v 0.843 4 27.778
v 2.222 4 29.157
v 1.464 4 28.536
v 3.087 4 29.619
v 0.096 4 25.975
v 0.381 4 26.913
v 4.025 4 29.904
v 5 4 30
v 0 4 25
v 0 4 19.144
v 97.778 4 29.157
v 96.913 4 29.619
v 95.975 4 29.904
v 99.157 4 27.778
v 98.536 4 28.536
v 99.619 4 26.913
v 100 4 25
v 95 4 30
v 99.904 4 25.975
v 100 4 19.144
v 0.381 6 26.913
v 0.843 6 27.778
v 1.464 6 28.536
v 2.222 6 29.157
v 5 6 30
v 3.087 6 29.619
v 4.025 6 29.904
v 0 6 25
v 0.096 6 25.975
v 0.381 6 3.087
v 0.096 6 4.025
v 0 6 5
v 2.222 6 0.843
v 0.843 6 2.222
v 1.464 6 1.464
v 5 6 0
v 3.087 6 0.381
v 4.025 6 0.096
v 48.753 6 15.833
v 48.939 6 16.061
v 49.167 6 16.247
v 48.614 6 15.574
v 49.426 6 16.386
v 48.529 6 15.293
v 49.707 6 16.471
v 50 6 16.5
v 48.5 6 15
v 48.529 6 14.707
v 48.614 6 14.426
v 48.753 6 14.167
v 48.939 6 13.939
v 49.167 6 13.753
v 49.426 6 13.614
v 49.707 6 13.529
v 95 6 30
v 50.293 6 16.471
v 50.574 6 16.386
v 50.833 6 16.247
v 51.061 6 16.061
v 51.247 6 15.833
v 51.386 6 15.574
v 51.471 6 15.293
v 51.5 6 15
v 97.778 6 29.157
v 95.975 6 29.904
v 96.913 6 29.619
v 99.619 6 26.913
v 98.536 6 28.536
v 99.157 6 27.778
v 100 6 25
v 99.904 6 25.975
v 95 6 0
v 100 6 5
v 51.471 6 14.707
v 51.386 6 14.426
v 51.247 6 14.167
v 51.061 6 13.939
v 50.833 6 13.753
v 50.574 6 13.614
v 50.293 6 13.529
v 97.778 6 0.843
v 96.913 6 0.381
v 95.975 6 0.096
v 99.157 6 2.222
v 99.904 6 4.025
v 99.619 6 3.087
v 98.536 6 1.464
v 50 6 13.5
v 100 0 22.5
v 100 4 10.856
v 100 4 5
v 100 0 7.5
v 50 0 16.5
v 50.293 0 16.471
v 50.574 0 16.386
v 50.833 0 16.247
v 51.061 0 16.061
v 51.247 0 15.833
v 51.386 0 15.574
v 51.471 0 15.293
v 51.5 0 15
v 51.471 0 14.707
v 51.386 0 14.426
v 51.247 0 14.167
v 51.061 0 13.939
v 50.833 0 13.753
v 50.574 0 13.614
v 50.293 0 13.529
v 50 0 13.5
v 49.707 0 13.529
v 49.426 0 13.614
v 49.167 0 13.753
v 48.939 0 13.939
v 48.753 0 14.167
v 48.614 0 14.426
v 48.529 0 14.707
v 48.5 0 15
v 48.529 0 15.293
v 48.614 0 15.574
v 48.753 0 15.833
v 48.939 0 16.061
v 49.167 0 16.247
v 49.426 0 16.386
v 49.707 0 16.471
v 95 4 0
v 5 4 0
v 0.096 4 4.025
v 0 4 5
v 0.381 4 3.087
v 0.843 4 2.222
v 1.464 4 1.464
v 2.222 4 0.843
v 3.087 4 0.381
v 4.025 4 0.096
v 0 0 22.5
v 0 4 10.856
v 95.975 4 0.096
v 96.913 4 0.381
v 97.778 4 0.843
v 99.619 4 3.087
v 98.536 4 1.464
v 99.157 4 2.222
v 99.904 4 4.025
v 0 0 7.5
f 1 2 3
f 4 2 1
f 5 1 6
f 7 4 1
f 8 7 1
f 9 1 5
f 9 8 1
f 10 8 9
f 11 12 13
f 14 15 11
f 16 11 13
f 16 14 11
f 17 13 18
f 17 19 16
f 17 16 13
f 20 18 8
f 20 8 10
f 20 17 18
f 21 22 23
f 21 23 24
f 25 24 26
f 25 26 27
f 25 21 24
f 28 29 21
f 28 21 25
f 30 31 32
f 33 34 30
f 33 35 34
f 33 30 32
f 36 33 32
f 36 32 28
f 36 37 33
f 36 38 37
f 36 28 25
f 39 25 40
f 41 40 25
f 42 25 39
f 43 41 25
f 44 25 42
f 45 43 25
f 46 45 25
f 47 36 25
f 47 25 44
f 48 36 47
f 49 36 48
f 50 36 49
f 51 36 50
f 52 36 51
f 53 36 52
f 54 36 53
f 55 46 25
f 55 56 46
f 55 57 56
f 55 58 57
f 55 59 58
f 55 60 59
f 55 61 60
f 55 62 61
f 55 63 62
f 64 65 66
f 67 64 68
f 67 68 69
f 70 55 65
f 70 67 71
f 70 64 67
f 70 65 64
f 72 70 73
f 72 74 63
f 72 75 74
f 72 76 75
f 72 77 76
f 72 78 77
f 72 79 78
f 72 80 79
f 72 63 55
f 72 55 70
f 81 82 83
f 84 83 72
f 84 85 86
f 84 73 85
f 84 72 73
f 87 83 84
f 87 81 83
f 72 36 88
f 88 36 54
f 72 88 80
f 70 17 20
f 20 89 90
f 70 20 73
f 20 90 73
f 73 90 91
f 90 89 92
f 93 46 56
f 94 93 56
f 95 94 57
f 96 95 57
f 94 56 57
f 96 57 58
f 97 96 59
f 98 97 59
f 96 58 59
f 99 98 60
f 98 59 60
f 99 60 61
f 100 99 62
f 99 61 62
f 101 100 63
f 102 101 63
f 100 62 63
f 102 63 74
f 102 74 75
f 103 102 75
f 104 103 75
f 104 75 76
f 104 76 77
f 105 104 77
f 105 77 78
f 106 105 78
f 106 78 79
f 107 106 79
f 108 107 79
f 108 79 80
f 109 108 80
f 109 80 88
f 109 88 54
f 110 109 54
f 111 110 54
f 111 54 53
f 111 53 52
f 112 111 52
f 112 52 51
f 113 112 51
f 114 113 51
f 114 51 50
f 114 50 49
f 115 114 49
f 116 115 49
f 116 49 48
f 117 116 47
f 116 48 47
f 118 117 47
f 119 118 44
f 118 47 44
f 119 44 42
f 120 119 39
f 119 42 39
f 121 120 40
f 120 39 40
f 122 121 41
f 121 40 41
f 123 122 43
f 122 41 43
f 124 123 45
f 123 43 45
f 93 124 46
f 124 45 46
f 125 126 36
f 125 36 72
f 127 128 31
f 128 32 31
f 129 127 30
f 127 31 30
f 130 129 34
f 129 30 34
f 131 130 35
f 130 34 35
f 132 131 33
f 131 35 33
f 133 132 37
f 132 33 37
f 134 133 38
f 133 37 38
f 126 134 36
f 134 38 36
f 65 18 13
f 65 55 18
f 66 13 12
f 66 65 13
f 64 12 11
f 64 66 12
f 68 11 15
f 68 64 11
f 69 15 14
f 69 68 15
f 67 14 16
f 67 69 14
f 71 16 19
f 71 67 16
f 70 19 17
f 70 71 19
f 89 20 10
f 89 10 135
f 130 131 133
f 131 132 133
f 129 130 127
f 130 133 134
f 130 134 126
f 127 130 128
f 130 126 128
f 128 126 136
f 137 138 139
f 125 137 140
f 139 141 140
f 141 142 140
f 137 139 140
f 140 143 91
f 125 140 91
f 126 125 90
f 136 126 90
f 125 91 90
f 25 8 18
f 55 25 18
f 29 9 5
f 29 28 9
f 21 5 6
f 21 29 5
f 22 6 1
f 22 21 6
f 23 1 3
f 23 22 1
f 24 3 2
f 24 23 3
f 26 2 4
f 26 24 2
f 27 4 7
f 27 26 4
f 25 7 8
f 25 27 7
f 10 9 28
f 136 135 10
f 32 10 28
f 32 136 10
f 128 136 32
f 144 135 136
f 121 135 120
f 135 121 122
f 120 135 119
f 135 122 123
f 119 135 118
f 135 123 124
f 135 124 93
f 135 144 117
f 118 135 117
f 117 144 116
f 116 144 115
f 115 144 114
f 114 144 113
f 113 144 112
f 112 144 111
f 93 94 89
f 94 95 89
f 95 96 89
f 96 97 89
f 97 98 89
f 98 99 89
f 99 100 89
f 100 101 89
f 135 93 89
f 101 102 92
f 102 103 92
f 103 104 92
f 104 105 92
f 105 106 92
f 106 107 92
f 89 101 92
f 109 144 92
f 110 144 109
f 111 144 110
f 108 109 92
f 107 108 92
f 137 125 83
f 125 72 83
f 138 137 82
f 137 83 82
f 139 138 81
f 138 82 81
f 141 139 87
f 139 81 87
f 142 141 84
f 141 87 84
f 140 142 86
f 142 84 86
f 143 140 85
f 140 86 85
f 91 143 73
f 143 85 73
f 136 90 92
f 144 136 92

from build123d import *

# Parameters (mm, degrees)
SKETCH4_W           = 100
SKETCH4_H           = 30
BOSS_EXTRUDE2_DEPTH = 6
CUT_EXTRUDE1_DEPTH  = 105.575331699
SKETCH7_R           = 1.5
CUT_EXTRUDE2_DEPTH  = 105.575331699
FILLET2_R           = 5
FILLET3_R           = 5


with BuildPart() as part:
    # Sketch4 → Boss-Extrude2 (new body)
    with BuildSketch(Plane(origin=(0, 0, 0), x_dir=(1, 0, 0), z_dir=(0, 1, 0))):
        with Locations((50, -15)):
            Rectangle(SKETCH4_W, SKETCH4_H)
    extrude(amount=BOSS_EXTRUDE2_DEPTH)

    # Sketch6 → Cut-Extrude1 (cut, through all)
    with BuildSketch(Plane(origin=(100, 0, 0), x_dir=(0, 0, -1), z_dir=(1, 0, 0))):
        Polygon((-7.5, 0), (0, 0), (0, 4), (-10.856398525, 4), align=None)
        Polygon((-22.5, 0), (-30, 0), (-30, 4), (-19.143601475, 4), align=None)
    extrude(amount=-CUT_EXTRUDE1_DEPTH, mode=Mode.SUBTRACT)

    # Sketch7 → Cut-Extrude2 (cut, through all)
    with BuildSketch(Plane(origin=(0, 6, 0), x_dir=(1, 0, 0), z_dir=(0, 1, 0))):
        with Locations(Location((50, -15, 0), (0, 0, 270))):
            Circle(SKETCH7_R)
    extrude(amount=-CUT_EXTRUDE2_DEPTH, mode=Mode.SUBTRACT)

    # Fillet2
    fillet2_edges = [part.edges().sort_by_distance(p)[0] for p in [
        (0, 5, 0),
    ]]
    fillet(fillet2_edges, radius=FILLET2_R)

    # Fillet3
    fillet3_edges = [part.edges().sort_by_distance(p)[0] for p in [
        (100, 5, 0),
        (100, 5, 30),
        (0, 5, 30),
    ]]
    fillet(fillet3_edges, radius=FILLET3_R)


solid = part.part
